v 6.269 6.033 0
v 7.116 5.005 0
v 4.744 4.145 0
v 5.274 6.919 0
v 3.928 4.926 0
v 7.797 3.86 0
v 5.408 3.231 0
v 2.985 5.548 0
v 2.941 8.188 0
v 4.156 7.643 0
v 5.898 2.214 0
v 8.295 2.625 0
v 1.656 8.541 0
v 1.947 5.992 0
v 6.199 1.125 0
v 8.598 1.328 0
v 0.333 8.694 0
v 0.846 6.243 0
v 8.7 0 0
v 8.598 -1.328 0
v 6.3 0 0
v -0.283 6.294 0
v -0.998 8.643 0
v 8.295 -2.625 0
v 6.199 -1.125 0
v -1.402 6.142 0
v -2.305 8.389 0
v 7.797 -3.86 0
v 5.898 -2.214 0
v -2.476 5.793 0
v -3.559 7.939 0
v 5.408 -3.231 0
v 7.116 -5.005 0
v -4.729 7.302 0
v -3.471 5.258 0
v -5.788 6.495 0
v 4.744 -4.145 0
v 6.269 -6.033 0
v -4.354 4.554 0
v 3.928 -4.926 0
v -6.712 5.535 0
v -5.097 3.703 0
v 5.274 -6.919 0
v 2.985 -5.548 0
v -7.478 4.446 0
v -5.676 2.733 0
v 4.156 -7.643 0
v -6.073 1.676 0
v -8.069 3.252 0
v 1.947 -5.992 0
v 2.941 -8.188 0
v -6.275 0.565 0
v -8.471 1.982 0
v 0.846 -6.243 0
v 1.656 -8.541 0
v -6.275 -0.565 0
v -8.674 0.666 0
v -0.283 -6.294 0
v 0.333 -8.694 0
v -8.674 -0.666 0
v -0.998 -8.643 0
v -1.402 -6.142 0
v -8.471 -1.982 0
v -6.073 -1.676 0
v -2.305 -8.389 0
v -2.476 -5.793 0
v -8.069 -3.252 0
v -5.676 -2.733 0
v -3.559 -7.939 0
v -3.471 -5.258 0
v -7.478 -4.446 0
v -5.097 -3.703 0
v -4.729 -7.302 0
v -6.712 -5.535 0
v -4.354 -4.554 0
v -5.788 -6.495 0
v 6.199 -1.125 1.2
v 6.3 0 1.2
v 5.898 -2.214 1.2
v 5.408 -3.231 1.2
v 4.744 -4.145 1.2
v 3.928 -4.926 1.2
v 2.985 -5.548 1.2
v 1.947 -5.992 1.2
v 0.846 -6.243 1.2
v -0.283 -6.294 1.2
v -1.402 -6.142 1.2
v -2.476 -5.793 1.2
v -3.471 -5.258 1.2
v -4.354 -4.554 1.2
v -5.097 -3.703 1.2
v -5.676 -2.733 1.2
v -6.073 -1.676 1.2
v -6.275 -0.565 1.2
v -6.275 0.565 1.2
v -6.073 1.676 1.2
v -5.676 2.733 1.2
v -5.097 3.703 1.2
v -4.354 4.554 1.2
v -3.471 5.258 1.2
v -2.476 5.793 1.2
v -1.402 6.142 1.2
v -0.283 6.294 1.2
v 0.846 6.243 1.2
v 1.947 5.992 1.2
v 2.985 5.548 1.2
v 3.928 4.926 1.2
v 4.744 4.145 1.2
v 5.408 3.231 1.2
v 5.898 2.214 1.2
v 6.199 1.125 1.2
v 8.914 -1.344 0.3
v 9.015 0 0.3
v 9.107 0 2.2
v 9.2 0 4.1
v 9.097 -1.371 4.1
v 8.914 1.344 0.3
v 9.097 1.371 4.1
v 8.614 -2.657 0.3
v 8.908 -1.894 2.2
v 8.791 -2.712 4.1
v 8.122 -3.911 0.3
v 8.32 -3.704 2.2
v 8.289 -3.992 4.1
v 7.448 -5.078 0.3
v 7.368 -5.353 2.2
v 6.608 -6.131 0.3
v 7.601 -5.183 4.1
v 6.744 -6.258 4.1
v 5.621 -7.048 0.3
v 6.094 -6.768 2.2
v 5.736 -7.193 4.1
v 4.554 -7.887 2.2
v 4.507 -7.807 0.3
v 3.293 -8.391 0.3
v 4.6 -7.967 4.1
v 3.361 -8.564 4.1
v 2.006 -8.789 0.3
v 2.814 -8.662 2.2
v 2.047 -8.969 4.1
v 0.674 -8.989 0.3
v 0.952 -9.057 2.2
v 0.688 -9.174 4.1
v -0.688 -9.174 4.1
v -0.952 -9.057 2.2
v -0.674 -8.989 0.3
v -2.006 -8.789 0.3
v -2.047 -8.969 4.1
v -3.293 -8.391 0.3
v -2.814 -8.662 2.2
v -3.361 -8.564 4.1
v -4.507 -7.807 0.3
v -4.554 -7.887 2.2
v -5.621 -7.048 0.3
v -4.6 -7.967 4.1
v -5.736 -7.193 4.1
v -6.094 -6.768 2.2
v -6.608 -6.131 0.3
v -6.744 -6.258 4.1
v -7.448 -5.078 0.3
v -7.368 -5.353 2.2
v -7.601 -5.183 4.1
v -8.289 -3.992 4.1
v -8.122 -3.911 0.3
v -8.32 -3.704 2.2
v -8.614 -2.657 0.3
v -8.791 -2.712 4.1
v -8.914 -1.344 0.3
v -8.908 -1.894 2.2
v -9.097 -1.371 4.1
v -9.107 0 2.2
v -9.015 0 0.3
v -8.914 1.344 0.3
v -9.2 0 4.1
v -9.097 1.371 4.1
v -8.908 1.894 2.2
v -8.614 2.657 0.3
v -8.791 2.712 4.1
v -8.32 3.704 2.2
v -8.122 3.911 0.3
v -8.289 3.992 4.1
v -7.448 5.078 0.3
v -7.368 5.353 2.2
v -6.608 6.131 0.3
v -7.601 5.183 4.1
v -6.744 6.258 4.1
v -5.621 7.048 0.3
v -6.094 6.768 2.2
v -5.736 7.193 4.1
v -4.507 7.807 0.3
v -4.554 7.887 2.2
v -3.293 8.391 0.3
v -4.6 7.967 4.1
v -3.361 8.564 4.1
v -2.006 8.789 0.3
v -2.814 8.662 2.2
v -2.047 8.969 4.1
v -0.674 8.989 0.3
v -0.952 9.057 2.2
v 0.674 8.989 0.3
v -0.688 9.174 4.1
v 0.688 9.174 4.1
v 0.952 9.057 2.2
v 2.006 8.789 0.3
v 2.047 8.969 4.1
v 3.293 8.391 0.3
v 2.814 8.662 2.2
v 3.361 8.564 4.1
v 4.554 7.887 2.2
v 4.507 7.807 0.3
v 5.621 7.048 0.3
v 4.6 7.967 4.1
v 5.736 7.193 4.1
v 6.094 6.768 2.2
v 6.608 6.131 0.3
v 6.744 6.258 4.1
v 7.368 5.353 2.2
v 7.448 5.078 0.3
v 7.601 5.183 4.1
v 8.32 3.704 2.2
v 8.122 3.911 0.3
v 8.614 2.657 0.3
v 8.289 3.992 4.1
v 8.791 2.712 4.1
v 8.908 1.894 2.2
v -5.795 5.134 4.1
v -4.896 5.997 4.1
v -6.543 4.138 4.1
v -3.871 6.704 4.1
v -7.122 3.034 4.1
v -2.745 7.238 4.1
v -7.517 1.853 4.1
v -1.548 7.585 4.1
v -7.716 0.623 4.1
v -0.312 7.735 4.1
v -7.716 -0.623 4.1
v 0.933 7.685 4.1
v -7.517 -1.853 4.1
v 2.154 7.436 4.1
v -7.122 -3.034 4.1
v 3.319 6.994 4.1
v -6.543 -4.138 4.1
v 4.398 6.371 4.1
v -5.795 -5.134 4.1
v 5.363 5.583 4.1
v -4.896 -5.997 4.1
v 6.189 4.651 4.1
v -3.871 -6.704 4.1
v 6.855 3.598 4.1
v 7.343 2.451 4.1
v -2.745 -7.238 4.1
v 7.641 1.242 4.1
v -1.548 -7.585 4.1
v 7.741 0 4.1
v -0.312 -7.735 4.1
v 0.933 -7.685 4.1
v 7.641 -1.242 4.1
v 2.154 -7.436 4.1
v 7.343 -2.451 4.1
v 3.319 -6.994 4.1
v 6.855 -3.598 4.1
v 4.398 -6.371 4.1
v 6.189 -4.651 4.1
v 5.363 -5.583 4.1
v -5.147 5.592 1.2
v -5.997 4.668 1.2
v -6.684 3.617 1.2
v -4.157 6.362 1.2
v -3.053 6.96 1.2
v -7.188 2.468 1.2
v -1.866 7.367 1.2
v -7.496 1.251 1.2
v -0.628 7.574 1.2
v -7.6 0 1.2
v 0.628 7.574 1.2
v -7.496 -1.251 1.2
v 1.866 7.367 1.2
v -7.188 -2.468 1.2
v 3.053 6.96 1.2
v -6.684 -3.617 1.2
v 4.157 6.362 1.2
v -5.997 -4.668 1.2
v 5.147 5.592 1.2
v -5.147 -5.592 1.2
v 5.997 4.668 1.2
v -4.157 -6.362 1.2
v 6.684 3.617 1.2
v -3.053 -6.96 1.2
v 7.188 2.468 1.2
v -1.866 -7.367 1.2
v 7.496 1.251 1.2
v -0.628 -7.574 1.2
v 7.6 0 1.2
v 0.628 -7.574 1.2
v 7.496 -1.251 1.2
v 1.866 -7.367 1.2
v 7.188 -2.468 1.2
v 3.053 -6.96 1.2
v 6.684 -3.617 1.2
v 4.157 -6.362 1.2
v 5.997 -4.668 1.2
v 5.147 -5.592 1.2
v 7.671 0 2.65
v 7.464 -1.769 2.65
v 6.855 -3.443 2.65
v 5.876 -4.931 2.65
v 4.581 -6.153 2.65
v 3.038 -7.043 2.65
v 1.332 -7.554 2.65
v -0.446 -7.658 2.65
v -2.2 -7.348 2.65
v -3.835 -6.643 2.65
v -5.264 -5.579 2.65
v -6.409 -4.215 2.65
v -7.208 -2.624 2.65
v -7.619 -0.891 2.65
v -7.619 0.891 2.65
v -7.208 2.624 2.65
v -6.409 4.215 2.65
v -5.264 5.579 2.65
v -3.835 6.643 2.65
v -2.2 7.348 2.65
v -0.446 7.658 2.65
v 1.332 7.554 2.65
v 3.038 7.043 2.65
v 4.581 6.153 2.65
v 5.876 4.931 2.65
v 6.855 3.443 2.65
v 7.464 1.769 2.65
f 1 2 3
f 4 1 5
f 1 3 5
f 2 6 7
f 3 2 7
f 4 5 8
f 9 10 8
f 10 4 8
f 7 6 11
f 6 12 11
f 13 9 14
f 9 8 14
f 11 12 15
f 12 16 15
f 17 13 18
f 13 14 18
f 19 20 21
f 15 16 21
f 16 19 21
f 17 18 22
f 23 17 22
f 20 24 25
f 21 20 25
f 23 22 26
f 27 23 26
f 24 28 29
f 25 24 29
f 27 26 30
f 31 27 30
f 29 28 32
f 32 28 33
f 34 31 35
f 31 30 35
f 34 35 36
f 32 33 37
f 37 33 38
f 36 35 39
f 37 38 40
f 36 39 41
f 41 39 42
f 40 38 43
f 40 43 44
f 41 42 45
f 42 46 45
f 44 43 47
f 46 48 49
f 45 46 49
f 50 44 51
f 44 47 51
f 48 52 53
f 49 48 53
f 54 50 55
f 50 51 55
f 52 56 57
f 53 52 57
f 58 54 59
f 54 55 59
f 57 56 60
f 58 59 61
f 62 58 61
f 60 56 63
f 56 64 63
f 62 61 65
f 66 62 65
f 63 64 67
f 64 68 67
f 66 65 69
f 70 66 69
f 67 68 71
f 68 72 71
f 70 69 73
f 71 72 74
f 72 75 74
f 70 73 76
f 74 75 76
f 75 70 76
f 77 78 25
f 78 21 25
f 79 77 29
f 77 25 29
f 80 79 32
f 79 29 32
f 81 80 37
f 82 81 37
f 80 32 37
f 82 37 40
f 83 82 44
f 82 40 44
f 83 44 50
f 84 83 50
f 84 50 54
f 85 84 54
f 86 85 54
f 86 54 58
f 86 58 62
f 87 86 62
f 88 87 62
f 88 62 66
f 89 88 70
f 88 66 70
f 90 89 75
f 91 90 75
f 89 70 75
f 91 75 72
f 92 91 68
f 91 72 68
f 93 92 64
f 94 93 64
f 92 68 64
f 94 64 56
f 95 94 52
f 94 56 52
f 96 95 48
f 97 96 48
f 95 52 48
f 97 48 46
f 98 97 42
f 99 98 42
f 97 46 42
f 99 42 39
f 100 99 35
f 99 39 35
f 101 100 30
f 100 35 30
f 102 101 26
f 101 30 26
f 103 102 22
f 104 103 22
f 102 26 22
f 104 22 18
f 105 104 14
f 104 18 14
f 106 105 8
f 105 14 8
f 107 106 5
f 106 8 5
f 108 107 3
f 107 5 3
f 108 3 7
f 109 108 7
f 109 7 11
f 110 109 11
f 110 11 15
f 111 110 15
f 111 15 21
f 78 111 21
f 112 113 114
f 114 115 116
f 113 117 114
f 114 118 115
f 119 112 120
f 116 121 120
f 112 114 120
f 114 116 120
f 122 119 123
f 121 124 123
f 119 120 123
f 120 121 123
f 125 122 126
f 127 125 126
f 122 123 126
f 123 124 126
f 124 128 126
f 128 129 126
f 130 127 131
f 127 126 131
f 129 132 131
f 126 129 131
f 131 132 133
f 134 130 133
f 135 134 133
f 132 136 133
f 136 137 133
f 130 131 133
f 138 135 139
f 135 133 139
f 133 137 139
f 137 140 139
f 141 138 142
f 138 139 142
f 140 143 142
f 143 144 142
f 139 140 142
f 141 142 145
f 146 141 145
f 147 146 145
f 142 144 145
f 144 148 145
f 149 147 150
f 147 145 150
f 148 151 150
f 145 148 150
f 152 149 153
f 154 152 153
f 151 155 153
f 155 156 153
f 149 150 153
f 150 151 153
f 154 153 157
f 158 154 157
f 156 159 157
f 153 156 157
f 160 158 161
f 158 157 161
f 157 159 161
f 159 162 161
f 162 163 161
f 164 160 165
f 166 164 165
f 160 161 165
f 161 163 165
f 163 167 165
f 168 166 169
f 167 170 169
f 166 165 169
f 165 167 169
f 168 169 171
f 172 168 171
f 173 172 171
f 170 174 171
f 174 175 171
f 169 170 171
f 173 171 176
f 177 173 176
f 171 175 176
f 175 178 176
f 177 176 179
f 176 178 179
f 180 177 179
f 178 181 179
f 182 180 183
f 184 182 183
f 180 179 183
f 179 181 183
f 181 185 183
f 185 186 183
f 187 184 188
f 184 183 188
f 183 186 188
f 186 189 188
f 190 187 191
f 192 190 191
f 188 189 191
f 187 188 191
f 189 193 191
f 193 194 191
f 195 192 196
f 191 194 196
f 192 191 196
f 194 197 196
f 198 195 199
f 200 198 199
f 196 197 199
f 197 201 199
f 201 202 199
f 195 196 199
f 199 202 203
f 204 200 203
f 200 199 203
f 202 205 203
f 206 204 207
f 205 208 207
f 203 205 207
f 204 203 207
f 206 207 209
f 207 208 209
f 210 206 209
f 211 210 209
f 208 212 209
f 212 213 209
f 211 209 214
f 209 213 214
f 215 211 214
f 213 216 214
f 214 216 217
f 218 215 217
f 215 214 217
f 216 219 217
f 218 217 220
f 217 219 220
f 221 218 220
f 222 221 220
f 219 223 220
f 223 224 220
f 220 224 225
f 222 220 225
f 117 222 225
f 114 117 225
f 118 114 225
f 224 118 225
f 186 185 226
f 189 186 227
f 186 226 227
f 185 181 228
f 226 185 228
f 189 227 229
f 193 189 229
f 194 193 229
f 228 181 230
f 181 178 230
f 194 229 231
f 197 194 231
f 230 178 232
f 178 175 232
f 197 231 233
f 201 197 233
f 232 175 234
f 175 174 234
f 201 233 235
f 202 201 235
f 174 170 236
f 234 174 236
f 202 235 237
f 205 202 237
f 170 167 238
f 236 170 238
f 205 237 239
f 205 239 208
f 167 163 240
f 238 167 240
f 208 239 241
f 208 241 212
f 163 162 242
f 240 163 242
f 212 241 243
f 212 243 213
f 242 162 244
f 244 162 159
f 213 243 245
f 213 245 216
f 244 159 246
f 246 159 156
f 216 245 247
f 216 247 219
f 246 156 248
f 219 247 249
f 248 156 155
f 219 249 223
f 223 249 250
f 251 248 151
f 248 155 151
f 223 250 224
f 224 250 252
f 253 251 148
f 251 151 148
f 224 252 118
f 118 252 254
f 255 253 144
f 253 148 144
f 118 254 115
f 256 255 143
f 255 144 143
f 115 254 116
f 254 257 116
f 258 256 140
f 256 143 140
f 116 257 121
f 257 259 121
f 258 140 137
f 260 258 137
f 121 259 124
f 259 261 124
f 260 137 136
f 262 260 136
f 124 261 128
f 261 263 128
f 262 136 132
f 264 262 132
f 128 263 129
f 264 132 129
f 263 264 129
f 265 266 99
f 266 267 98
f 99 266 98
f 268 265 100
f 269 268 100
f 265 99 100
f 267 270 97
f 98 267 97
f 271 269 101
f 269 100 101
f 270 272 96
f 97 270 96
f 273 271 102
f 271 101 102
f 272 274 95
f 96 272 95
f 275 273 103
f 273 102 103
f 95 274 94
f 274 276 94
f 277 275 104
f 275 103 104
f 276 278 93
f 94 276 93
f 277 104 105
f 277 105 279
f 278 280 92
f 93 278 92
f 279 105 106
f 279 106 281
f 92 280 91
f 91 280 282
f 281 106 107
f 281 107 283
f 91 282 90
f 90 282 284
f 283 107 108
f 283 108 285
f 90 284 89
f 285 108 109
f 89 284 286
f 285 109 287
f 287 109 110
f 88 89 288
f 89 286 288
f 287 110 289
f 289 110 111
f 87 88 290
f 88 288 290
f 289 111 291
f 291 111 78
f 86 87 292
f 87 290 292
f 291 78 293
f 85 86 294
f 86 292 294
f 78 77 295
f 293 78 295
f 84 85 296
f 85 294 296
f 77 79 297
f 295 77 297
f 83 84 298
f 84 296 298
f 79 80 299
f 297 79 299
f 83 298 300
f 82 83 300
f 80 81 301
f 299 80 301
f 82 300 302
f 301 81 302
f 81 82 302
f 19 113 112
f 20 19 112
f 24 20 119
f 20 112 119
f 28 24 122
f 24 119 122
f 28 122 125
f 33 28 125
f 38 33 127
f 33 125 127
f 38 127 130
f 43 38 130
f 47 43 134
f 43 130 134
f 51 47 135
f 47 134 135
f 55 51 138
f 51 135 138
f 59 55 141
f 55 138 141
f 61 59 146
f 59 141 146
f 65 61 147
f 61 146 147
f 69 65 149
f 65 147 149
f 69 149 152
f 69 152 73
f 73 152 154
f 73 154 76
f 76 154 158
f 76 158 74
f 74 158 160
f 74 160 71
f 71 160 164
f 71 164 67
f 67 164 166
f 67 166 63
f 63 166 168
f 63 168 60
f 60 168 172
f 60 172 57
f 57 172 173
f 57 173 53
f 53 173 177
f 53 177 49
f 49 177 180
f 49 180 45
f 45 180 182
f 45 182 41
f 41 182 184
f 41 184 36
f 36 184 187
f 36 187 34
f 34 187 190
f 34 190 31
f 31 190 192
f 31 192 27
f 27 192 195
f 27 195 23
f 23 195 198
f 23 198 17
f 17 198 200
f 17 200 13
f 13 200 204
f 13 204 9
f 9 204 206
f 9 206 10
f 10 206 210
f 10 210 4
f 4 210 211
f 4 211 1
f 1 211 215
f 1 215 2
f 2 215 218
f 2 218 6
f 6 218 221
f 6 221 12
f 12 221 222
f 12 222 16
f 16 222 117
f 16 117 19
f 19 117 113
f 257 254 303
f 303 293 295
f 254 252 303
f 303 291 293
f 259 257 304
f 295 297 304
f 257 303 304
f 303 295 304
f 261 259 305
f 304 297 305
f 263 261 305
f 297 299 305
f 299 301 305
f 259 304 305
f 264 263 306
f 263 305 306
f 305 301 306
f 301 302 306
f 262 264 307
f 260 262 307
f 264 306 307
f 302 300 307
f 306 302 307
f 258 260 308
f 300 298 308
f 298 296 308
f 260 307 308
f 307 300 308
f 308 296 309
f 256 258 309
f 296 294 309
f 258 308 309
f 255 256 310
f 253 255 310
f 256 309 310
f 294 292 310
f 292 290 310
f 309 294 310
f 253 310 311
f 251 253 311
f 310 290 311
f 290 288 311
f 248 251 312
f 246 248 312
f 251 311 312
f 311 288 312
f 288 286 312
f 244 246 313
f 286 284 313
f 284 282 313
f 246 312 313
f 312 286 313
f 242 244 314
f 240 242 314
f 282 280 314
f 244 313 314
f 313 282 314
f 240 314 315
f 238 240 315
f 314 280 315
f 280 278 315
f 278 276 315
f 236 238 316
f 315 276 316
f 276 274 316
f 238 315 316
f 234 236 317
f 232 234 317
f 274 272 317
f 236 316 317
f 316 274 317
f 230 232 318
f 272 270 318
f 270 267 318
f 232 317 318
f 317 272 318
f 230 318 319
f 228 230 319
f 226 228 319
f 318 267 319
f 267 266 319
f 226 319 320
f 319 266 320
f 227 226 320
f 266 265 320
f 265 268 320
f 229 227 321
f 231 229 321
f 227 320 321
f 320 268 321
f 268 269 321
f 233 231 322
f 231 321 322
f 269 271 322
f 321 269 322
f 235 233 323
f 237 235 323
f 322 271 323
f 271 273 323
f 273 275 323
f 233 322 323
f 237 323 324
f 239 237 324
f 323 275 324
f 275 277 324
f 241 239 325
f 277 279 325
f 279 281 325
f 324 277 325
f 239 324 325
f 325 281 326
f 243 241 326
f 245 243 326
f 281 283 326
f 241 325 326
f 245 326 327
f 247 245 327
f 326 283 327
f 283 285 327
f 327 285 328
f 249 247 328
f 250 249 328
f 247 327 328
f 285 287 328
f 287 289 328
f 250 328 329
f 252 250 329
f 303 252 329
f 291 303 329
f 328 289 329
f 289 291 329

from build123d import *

# Parameters (mm, degrees)
F2_SIZE = 0.3


with BuildPart() as f1:
    # F0 (on Front) → F1 (revolve)
    with BuildSketch(Plane.XZ):
        Polygon((6.3, 1.2), (6.3, 0), (9, 0), (9.2, 4.1), (7.741463, 4.1), (7.6, 1.2), align=None)
    revolve(axis=Axis((0, 0, 3.37447), (0, 0, -1)))

    # F2
    f2_edges = [f1.edges().sort_by_distance(p)[0] for p in [
        (-9, 0, 0),
    ]]
    chamfer(f2_edges, length=F2_SIZE)


solid = f1.part
